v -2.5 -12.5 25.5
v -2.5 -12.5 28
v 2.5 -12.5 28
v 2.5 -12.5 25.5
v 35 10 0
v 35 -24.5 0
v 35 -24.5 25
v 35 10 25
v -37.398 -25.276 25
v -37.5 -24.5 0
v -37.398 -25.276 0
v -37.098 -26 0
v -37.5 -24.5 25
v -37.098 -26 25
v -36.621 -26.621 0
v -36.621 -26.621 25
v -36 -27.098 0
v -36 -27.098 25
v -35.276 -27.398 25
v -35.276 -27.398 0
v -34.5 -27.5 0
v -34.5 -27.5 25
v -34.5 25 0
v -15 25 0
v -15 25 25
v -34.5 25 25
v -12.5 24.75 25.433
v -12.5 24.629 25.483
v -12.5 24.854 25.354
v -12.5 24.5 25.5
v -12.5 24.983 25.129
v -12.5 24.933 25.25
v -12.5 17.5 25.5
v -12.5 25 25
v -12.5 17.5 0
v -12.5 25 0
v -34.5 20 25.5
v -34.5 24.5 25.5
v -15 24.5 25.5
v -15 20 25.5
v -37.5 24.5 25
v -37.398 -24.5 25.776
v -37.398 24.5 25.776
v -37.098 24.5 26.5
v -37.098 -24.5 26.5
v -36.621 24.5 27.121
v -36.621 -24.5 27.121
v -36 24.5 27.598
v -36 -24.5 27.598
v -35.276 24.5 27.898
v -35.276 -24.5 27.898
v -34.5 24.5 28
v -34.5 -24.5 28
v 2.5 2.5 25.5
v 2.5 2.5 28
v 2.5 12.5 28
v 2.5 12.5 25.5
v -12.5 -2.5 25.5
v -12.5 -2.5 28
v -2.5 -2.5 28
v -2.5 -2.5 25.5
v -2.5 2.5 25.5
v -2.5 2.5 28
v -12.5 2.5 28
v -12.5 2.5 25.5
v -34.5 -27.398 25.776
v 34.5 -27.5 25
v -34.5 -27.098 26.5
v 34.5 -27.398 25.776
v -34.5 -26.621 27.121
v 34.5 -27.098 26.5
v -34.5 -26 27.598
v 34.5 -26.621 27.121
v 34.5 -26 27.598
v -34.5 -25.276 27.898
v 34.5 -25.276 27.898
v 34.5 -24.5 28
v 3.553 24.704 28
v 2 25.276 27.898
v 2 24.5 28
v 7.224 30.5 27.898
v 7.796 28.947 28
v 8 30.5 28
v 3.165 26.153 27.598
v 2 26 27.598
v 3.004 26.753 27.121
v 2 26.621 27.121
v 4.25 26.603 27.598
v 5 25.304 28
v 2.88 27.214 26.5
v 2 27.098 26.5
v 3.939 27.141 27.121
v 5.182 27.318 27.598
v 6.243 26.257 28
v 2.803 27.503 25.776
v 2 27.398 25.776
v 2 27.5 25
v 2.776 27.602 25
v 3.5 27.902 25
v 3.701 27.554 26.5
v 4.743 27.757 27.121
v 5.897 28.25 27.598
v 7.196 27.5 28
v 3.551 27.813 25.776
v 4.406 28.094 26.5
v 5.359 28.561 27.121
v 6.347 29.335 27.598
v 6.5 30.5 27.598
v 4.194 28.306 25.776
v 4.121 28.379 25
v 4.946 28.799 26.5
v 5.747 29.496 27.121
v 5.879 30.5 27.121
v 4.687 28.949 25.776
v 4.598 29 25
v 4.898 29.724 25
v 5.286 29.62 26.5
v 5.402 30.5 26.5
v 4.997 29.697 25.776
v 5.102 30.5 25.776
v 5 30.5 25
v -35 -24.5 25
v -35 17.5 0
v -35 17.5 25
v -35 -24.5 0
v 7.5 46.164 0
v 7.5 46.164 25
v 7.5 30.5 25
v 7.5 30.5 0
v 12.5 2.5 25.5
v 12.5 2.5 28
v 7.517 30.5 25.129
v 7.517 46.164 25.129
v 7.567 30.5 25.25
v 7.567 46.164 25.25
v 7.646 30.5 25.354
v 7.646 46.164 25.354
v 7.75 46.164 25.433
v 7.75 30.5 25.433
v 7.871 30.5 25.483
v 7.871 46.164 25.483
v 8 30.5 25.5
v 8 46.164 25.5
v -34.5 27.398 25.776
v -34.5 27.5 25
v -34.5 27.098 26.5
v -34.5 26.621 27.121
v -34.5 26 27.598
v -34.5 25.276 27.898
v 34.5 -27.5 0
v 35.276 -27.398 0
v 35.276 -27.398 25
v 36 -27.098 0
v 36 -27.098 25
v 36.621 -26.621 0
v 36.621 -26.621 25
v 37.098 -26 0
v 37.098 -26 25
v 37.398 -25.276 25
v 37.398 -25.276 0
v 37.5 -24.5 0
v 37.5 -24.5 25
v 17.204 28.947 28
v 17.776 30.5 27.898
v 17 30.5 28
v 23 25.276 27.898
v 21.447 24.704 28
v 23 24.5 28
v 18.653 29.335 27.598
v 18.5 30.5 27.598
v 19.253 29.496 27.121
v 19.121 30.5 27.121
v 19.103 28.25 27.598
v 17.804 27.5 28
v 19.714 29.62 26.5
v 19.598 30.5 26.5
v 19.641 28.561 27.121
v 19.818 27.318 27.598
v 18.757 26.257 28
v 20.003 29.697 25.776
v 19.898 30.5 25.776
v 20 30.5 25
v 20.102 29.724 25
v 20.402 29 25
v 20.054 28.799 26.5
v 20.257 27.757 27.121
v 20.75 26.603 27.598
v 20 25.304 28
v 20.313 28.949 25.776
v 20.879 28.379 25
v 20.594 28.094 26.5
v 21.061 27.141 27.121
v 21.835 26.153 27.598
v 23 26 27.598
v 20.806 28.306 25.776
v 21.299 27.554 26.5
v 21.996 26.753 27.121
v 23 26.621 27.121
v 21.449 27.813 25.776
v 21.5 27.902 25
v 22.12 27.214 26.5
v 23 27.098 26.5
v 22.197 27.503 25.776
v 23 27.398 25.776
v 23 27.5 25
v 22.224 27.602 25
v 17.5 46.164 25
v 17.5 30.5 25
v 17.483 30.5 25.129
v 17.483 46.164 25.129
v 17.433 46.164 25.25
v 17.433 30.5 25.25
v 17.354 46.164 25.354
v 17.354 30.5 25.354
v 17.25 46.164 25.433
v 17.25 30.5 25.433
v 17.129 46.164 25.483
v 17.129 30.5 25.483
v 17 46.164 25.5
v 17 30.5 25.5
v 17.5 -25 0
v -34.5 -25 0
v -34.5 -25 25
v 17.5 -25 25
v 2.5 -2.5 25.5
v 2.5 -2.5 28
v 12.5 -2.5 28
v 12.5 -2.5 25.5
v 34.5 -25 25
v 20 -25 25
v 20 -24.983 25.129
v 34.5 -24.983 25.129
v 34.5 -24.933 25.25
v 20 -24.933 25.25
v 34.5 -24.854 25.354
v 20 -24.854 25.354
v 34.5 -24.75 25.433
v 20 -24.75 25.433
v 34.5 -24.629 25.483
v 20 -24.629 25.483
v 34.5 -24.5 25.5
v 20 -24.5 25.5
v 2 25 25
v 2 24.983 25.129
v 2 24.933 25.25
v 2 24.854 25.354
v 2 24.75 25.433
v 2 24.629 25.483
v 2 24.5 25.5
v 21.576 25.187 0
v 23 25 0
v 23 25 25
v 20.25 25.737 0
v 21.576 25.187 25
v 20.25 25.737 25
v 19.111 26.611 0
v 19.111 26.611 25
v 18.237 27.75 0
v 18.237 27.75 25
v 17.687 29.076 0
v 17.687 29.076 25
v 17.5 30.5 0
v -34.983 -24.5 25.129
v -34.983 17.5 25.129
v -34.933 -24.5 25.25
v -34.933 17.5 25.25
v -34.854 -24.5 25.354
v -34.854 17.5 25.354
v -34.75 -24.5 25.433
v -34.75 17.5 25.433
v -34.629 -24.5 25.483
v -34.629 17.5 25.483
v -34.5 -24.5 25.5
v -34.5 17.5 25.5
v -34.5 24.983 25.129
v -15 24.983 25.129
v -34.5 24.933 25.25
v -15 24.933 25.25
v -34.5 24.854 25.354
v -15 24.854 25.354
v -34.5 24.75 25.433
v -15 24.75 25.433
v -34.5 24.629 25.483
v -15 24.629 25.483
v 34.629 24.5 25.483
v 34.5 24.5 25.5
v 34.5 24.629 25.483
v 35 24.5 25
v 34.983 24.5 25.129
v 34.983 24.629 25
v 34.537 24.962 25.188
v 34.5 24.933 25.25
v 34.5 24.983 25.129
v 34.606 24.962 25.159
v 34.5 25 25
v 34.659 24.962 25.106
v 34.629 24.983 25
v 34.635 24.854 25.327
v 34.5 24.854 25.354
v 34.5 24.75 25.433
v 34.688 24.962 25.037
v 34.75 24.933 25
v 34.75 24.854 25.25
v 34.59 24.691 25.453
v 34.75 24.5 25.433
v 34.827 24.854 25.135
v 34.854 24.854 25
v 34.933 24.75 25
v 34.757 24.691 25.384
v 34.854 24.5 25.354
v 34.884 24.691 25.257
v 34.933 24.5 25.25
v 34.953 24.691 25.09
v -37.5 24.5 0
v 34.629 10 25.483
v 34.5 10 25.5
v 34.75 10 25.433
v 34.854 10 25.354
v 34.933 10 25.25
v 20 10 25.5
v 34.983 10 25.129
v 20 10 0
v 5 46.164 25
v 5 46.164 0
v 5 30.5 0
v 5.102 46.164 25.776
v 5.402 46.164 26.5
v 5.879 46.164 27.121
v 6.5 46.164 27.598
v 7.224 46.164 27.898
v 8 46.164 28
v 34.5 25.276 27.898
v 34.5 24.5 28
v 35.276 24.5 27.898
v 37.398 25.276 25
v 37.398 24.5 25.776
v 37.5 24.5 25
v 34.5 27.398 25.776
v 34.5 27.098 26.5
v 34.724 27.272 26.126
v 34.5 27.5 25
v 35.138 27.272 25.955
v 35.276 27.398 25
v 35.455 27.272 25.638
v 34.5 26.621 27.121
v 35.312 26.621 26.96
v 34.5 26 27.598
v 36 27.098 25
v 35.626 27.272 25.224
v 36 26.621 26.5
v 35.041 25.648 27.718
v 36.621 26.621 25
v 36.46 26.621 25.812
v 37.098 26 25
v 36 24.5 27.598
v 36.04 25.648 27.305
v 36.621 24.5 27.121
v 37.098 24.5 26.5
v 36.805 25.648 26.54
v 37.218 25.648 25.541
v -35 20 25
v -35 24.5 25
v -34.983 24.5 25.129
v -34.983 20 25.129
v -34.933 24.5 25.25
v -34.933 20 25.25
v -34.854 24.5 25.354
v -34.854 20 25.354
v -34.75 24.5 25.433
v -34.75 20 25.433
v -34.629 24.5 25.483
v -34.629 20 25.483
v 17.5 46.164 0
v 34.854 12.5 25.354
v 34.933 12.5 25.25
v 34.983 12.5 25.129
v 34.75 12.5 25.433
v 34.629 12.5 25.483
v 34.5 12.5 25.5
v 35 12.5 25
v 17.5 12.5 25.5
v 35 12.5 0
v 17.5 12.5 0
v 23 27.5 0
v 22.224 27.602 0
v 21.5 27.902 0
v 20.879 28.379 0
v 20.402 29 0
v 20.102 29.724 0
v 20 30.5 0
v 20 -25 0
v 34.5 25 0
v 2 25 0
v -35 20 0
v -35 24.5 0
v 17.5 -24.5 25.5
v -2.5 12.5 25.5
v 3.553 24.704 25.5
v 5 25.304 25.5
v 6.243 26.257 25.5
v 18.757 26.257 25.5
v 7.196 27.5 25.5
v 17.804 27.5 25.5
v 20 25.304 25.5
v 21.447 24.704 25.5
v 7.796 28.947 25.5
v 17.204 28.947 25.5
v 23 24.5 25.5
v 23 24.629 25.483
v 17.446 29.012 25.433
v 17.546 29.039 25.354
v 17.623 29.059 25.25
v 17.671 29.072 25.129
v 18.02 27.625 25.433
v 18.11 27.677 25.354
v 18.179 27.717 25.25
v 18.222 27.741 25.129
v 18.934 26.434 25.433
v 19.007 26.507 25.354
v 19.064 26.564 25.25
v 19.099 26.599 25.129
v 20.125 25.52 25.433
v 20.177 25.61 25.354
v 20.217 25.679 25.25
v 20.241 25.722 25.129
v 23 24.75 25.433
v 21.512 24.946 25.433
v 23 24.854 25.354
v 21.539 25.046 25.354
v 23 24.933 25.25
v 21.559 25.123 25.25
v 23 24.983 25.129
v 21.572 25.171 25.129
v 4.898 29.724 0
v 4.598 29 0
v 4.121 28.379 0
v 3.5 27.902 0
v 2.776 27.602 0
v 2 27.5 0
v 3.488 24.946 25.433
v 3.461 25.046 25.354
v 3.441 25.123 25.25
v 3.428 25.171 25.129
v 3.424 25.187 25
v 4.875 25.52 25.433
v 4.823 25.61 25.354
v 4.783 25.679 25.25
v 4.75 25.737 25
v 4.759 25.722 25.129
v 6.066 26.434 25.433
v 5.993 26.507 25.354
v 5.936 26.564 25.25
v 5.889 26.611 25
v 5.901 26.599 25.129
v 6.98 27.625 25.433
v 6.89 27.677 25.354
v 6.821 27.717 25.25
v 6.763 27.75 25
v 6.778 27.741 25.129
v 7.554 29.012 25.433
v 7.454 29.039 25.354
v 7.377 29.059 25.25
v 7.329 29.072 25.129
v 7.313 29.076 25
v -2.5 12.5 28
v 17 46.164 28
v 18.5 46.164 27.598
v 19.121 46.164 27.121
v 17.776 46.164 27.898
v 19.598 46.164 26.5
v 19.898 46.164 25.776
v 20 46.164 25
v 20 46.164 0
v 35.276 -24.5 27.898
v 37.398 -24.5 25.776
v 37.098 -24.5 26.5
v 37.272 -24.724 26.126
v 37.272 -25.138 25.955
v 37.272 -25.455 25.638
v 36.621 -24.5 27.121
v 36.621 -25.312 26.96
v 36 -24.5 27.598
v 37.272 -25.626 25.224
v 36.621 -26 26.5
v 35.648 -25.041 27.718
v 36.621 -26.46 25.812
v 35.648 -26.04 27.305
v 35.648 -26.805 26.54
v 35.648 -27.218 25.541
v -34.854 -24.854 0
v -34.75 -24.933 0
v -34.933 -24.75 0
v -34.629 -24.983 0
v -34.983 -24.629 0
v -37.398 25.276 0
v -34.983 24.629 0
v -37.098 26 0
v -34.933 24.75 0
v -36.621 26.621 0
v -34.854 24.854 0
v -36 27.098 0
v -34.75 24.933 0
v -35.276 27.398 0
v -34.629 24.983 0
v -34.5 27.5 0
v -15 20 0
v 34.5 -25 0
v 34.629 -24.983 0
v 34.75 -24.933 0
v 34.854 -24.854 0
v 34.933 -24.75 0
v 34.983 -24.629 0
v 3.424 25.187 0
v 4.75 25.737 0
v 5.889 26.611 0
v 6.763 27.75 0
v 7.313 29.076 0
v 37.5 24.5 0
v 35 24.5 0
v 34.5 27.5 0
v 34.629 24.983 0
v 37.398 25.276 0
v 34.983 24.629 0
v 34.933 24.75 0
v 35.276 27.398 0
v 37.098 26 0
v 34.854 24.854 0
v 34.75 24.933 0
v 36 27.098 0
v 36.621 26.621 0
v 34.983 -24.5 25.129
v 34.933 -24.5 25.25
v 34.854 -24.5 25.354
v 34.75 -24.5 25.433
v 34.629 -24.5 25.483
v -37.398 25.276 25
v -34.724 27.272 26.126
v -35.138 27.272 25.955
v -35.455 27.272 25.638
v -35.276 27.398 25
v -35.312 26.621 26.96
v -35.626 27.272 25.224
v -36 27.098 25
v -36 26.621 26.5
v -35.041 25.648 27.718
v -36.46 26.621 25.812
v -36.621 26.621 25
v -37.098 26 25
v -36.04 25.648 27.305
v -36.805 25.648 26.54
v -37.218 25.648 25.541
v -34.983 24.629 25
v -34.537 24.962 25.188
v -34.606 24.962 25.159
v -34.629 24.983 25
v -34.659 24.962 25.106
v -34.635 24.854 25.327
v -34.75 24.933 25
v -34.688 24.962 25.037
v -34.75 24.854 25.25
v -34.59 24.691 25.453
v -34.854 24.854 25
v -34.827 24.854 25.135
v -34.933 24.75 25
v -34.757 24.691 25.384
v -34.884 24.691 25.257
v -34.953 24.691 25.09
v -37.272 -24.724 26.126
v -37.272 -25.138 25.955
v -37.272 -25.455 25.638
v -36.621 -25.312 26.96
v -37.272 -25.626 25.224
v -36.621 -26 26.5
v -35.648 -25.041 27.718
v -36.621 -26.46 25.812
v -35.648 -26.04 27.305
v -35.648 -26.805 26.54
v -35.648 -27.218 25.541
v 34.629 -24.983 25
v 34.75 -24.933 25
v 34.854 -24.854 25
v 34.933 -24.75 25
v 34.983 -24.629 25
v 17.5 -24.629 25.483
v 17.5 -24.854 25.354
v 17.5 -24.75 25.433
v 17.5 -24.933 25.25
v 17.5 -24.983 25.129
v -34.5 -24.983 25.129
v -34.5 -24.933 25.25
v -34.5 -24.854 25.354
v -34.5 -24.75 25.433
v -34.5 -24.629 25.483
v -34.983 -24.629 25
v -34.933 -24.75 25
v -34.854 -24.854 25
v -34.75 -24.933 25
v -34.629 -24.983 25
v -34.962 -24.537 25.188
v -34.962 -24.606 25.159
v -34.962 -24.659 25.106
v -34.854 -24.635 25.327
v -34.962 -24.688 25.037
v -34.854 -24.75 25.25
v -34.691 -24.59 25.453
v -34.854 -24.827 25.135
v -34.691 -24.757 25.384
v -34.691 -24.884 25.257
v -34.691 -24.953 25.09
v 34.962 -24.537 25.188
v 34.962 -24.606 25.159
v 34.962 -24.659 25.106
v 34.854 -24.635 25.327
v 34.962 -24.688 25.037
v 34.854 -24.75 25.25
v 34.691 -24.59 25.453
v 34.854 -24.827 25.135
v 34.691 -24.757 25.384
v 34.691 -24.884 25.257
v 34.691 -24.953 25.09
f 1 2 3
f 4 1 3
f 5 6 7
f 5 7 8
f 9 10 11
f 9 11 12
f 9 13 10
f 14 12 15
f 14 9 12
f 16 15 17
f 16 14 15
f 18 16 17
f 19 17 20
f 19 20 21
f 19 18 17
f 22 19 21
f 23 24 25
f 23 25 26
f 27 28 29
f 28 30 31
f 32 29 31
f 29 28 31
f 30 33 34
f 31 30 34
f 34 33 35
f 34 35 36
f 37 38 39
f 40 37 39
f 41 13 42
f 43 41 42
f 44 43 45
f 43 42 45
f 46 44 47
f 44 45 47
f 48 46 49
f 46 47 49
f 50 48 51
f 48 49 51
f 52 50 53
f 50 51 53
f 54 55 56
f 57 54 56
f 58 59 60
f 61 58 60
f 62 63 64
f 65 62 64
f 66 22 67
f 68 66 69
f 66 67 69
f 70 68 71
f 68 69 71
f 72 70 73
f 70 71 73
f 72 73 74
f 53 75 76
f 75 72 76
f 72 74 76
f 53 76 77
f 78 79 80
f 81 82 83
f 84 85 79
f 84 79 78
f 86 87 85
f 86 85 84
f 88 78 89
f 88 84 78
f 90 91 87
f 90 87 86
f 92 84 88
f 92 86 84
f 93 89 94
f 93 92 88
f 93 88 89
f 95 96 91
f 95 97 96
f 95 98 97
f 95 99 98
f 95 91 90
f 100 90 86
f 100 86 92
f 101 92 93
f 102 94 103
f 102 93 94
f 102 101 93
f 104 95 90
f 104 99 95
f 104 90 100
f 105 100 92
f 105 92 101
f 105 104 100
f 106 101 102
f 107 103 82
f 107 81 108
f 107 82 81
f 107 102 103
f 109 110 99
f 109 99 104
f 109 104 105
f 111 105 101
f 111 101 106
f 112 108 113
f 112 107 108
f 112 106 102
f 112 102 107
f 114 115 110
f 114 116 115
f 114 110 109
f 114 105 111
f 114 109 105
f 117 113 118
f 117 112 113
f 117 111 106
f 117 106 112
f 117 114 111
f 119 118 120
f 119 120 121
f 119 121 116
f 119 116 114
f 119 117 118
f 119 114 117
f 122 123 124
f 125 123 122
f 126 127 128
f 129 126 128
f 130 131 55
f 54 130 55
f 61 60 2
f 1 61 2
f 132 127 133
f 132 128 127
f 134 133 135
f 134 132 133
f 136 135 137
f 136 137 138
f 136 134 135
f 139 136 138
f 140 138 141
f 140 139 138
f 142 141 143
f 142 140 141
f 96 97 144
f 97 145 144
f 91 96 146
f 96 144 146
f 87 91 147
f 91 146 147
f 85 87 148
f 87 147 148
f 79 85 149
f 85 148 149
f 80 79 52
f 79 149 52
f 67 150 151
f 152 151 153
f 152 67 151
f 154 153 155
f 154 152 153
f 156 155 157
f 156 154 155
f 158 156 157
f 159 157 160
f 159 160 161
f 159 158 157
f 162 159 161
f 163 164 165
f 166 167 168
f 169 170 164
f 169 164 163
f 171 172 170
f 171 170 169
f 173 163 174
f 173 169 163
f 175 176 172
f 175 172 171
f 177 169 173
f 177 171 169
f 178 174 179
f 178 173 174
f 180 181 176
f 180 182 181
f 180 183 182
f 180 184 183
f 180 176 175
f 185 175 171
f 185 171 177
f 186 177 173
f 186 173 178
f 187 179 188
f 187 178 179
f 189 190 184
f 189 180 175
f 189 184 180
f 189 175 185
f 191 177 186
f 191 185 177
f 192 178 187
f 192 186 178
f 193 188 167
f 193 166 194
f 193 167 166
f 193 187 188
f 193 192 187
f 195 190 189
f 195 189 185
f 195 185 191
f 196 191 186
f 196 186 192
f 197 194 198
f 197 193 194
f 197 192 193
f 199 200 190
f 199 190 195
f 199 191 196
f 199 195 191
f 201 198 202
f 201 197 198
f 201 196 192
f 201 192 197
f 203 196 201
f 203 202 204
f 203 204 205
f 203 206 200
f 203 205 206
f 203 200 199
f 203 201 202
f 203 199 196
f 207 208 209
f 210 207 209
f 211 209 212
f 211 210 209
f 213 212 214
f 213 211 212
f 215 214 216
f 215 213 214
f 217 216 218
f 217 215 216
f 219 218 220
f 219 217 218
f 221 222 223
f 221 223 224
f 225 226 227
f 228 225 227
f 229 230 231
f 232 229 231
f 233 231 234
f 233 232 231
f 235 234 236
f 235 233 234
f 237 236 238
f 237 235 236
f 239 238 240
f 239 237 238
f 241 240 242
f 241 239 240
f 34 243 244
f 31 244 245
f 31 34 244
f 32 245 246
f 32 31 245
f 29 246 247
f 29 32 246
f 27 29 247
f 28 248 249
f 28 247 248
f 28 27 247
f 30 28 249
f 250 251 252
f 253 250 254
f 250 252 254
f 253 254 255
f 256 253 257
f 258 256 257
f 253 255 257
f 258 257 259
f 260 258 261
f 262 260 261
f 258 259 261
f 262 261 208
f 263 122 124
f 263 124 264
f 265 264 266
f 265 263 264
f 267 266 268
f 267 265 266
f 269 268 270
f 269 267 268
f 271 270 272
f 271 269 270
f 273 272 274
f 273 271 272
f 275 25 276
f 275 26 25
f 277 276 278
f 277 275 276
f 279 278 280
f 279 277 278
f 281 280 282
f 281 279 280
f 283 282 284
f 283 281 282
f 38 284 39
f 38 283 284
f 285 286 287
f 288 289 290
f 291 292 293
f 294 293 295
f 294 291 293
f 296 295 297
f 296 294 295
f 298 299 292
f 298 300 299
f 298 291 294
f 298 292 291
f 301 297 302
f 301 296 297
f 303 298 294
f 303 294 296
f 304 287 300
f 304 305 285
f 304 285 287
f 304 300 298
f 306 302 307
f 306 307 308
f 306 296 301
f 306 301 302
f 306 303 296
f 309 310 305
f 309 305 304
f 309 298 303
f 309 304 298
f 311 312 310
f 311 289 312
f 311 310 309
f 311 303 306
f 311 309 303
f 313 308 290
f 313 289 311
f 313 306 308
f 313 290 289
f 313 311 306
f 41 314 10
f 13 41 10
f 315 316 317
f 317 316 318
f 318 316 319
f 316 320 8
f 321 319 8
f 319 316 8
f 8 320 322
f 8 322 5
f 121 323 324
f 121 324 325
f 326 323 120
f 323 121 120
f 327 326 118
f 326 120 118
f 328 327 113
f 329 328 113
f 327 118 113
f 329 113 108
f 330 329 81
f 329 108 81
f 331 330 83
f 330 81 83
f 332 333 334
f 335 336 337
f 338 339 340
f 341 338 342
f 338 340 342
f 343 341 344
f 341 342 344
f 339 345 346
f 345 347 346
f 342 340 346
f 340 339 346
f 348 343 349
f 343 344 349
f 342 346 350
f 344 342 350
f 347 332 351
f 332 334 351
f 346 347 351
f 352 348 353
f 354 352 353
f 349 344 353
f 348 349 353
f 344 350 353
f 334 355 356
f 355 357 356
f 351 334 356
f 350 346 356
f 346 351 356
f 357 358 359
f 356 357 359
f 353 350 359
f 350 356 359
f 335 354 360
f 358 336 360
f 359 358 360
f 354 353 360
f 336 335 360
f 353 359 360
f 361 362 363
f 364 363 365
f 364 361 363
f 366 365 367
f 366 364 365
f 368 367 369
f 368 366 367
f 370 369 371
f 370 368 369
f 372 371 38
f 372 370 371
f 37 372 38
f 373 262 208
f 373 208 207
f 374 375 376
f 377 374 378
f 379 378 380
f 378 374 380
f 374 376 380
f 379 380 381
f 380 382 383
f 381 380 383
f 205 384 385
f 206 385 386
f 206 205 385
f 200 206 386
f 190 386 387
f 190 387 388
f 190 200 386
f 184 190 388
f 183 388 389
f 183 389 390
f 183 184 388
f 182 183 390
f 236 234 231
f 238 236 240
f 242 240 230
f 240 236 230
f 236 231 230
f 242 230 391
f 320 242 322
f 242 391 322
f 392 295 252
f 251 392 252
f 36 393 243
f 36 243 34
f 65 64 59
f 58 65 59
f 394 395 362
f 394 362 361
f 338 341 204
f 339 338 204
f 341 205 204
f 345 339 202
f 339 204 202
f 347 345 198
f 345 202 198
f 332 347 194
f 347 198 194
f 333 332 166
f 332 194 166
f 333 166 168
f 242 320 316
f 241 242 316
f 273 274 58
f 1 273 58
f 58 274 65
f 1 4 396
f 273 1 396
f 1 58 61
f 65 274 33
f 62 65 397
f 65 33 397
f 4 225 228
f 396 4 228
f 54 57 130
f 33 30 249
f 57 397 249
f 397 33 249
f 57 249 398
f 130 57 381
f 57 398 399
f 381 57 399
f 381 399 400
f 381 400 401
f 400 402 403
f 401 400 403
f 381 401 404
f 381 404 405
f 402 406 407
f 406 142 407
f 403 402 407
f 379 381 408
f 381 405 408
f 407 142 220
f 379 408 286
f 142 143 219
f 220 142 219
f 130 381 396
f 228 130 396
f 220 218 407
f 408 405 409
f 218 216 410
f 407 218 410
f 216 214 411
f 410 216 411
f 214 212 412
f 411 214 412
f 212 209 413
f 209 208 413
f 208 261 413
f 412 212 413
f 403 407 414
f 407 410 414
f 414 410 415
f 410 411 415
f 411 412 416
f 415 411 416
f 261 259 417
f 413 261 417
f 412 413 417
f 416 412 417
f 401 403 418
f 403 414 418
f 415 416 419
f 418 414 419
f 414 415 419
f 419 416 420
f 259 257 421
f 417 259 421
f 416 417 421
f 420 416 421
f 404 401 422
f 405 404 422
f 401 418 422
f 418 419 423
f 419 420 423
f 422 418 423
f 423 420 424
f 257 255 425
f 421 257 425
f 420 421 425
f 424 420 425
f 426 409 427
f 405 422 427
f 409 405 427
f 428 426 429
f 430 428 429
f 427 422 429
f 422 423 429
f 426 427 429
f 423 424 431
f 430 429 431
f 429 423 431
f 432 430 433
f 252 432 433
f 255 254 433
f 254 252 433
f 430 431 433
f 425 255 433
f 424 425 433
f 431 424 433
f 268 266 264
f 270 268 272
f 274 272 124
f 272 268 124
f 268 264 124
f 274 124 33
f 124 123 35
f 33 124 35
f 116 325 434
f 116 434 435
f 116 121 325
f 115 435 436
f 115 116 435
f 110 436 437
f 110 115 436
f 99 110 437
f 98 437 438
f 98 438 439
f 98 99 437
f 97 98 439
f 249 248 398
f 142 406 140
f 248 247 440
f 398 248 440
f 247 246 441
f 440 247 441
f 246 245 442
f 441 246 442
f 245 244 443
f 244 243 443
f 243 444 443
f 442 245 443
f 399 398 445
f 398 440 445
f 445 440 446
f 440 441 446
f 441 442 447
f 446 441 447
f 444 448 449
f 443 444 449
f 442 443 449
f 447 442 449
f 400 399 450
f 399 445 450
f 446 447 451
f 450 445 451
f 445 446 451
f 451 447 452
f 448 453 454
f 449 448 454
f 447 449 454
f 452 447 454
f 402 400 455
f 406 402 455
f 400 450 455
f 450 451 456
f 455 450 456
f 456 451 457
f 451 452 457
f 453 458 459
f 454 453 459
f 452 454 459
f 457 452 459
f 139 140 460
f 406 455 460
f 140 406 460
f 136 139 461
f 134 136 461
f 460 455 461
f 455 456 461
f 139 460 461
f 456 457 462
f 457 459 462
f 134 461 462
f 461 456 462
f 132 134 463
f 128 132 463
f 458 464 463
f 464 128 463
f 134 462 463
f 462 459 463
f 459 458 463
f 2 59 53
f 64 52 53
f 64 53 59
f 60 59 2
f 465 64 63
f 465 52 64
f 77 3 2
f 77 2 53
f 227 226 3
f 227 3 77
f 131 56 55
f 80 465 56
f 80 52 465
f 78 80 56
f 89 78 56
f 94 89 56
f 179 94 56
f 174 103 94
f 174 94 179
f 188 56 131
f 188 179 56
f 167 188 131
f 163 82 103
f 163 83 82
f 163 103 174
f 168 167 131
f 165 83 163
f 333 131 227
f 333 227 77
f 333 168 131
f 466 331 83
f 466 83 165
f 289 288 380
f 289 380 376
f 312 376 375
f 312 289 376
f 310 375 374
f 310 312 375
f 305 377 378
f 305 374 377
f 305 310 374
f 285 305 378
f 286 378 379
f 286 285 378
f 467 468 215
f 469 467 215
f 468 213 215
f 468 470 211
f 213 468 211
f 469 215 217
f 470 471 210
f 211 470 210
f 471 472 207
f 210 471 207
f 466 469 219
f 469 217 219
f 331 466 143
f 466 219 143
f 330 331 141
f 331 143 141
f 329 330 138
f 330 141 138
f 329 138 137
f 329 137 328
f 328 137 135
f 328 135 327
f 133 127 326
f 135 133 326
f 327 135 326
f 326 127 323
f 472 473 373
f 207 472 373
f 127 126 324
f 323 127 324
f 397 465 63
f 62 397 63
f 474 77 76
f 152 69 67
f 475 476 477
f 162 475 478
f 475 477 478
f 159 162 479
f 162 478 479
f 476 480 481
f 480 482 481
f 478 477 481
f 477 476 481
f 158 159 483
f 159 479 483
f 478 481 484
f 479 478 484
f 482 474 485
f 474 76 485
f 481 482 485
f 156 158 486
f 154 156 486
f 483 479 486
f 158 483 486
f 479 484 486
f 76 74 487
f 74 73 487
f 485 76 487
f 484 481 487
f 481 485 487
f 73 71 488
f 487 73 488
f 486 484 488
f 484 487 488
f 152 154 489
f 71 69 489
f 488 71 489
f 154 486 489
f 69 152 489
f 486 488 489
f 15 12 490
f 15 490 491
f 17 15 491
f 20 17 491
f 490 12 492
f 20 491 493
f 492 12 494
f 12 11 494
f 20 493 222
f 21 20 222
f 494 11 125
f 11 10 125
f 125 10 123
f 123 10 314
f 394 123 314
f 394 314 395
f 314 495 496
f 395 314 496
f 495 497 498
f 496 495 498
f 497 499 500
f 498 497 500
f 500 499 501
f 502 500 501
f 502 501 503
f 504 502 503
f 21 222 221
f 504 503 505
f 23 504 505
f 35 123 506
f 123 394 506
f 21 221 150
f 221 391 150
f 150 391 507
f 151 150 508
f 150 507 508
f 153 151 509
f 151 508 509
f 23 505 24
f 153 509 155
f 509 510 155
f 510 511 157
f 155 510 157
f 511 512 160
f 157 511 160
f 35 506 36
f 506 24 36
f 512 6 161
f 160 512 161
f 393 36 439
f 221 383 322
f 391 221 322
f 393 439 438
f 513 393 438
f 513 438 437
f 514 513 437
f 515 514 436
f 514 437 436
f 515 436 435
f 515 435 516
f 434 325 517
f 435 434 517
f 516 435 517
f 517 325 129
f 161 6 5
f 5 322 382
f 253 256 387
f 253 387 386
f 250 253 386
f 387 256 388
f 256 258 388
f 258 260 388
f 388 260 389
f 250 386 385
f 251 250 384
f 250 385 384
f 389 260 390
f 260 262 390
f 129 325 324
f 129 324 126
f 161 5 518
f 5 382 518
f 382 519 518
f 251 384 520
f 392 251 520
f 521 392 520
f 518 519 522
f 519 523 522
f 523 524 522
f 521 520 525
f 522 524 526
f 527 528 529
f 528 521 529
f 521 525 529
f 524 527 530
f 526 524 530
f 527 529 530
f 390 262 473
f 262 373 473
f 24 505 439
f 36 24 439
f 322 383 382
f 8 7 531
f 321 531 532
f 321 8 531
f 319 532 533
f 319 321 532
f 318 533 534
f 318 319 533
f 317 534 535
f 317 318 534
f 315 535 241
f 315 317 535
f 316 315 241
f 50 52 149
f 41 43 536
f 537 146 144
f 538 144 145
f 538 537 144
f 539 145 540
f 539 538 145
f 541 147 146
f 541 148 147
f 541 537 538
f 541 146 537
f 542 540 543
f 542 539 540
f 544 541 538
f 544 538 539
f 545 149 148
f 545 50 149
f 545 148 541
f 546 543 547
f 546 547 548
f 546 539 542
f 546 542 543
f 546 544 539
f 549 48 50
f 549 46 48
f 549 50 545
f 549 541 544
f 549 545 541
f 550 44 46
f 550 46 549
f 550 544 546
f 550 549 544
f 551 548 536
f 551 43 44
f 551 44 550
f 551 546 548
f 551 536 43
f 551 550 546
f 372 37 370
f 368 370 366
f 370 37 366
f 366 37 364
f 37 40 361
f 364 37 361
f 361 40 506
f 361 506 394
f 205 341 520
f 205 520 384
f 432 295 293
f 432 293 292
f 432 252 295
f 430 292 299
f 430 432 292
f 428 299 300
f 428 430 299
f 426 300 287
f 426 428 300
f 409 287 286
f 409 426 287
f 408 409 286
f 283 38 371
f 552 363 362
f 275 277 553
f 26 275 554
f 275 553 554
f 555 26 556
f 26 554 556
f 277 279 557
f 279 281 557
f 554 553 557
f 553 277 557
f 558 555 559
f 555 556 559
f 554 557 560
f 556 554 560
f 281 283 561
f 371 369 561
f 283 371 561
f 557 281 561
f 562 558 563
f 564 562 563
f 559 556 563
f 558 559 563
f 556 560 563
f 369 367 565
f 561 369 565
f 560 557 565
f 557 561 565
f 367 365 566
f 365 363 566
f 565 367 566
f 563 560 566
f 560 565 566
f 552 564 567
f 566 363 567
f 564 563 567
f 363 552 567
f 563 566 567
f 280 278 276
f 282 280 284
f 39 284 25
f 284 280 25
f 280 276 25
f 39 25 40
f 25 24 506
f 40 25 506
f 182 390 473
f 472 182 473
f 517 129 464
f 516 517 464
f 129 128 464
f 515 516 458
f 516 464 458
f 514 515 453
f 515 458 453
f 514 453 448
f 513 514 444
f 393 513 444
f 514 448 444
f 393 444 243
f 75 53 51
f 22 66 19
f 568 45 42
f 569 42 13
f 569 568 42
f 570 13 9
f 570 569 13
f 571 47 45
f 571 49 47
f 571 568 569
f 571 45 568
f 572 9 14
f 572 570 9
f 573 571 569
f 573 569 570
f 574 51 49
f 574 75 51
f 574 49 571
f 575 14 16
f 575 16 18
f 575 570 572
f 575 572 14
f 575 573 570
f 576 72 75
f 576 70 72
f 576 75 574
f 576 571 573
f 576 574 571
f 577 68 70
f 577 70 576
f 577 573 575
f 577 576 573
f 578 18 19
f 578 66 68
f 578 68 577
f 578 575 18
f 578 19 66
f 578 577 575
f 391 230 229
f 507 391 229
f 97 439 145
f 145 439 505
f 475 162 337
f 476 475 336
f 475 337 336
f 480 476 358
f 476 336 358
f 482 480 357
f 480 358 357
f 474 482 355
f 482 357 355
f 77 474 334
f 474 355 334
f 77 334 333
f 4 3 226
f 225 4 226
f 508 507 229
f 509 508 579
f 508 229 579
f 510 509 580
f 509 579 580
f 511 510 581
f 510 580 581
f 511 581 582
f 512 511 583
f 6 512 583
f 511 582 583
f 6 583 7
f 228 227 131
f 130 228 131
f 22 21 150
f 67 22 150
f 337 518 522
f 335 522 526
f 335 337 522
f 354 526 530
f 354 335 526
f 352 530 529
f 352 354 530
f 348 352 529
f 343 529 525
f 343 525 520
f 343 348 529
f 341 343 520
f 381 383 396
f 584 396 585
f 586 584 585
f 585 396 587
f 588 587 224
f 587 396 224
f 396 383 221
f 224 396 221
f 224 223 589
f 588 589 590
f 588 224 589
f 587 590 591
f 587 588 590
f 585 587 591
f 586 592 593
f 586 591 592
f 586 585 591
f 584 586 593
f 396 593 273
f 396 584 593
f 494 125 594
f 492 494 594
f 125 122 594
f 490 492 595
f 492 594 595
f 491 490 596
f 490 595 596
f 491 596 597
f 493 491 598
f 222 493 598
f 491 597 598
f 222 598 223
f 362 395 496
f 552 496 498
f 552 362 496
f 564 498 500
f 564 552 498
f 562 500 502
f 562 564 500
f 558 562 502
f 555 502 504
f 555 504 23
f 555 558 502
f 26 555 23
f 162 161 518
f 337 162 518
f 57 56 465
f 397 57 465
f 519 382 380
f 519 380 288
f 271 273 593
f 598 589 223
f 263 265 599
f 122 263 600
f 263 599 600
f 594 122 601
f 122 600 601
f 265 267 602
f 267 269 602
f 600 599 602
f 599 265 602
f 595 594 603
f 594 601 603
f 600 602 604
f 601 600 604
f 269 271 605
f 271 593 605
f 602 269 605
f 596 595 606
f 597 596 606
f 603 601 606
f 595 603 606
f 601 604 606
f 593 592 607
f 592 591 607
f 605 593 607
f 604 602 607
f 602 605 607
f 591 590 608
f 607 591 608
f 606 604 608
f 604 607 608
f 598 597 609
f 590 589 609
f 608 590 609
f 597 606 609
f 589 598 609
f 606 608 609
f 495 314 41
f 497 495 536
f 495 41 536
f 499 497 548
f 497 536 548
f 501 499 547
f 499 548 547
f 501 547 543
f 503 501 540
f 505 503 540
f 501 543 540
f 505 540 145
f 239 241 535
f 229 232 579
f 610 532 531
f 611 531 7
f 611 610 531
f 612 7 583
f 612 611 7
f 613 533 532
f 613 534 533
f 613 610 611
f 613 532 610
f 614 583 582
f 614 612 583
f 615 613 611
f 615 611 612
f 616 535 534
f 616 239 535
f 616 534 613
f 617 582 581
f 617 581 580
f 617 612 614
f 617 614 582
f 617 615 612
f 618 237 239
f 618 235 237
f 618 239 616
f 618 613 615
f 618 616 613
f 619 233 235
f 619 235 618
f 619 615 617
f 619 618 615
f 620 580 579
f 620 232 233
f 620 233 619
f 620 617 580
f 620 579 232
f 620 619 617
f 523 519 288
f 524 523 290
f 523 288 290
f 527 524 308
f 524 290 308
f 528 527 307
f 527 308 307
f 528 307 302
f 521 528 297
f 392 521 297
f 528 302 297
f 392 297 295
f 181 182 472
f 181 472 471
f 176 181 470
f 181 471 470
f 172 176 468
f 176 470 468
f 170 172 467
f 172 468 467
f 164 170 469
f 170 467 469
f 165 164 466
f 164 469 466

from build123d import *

# Parameters (mm, degrees)
F1_DEPTH = 28
F2_R     = 3
F3_T     = -2.5
F5_DEPTH = 25.5
F7_DEPTH = 2.5


with BuildPart() as f1:
    # F0 (on Top) → F1 (new body)
    with BuildSketch(Plane.XY):
        Polygon((-37.5, 27.5), (-37.5, -27.5), (37.5, -27.5), (37.5, 27.5), (20, 27.5), (20, 46.1637973785), (5, 46.1637973785), (5, 27.5), align=None)
    extrude(amount=F1_DEPTH)

    # F2
    f2_edges = [f1.edges().sort_by_distance(p)[0] for p in [
        (0, -27.5, 28),
        (37.5, 0, 28),
        (28.75, 27.5, 28),
        (37.5, 27.5, 14),
        (-37.5, 0, 28),
        (37.5, -27.5, 14),
        (-37.5, -27.5, 14),
        (-16.25, 27.5, 28),
        (5, 36.831899, 28),
        (5, 27.5, 14),
        (-37.5, 27.5, 14),
        (20, 27.5, 14),
        (20, 36.831899, 28),
    ]]
    fillet(f2_edges, radius=F2_R)

    # F3
    f3_openings = [f1.faces().sort_by_distance(p)[0] for p in [
        (0.806106, 2.36763, 0),
        (12.5, 46.163797, 13.876264),
    ]]
    offset(amount=F3_T, openings=f3_openings)

    # F4 (on Top) → F5 (join, through all)
    with BuildSketch(Plane.XY):
        Polygon((17.5, 12.5), (17.5, -25), (20, -25), (20, 10), (35, 10), (35, 12.5), align=None)
        Polygon((-12.5, 17.5), (-12.5, 25), (-15, 25), (-15, 20), (-35, 20), (-35, 17.5), align=None)
    extrude(amount=F5_DEPTH)

    # F6 (on face) → F7 (cut, through all)
    with BuildSketch(Plane.XY.offset(28)):
        Polygon((2.5, 12.5), (-2.5, 12.5), (-2.5, 2.5), (-12.5, 2.5), (-12.5, -2.5), (-2.5, -2.5), (-2.5, -12.5), (2.5, -12.5), (2.5, -2.5), (12.5, -2.5), (12.5, 2.5), (2.5, 2.5), align=None)
    extrude(amount=-F7_DEPTH, mode=Mode.SUBTRACT)


solid = f1.part
